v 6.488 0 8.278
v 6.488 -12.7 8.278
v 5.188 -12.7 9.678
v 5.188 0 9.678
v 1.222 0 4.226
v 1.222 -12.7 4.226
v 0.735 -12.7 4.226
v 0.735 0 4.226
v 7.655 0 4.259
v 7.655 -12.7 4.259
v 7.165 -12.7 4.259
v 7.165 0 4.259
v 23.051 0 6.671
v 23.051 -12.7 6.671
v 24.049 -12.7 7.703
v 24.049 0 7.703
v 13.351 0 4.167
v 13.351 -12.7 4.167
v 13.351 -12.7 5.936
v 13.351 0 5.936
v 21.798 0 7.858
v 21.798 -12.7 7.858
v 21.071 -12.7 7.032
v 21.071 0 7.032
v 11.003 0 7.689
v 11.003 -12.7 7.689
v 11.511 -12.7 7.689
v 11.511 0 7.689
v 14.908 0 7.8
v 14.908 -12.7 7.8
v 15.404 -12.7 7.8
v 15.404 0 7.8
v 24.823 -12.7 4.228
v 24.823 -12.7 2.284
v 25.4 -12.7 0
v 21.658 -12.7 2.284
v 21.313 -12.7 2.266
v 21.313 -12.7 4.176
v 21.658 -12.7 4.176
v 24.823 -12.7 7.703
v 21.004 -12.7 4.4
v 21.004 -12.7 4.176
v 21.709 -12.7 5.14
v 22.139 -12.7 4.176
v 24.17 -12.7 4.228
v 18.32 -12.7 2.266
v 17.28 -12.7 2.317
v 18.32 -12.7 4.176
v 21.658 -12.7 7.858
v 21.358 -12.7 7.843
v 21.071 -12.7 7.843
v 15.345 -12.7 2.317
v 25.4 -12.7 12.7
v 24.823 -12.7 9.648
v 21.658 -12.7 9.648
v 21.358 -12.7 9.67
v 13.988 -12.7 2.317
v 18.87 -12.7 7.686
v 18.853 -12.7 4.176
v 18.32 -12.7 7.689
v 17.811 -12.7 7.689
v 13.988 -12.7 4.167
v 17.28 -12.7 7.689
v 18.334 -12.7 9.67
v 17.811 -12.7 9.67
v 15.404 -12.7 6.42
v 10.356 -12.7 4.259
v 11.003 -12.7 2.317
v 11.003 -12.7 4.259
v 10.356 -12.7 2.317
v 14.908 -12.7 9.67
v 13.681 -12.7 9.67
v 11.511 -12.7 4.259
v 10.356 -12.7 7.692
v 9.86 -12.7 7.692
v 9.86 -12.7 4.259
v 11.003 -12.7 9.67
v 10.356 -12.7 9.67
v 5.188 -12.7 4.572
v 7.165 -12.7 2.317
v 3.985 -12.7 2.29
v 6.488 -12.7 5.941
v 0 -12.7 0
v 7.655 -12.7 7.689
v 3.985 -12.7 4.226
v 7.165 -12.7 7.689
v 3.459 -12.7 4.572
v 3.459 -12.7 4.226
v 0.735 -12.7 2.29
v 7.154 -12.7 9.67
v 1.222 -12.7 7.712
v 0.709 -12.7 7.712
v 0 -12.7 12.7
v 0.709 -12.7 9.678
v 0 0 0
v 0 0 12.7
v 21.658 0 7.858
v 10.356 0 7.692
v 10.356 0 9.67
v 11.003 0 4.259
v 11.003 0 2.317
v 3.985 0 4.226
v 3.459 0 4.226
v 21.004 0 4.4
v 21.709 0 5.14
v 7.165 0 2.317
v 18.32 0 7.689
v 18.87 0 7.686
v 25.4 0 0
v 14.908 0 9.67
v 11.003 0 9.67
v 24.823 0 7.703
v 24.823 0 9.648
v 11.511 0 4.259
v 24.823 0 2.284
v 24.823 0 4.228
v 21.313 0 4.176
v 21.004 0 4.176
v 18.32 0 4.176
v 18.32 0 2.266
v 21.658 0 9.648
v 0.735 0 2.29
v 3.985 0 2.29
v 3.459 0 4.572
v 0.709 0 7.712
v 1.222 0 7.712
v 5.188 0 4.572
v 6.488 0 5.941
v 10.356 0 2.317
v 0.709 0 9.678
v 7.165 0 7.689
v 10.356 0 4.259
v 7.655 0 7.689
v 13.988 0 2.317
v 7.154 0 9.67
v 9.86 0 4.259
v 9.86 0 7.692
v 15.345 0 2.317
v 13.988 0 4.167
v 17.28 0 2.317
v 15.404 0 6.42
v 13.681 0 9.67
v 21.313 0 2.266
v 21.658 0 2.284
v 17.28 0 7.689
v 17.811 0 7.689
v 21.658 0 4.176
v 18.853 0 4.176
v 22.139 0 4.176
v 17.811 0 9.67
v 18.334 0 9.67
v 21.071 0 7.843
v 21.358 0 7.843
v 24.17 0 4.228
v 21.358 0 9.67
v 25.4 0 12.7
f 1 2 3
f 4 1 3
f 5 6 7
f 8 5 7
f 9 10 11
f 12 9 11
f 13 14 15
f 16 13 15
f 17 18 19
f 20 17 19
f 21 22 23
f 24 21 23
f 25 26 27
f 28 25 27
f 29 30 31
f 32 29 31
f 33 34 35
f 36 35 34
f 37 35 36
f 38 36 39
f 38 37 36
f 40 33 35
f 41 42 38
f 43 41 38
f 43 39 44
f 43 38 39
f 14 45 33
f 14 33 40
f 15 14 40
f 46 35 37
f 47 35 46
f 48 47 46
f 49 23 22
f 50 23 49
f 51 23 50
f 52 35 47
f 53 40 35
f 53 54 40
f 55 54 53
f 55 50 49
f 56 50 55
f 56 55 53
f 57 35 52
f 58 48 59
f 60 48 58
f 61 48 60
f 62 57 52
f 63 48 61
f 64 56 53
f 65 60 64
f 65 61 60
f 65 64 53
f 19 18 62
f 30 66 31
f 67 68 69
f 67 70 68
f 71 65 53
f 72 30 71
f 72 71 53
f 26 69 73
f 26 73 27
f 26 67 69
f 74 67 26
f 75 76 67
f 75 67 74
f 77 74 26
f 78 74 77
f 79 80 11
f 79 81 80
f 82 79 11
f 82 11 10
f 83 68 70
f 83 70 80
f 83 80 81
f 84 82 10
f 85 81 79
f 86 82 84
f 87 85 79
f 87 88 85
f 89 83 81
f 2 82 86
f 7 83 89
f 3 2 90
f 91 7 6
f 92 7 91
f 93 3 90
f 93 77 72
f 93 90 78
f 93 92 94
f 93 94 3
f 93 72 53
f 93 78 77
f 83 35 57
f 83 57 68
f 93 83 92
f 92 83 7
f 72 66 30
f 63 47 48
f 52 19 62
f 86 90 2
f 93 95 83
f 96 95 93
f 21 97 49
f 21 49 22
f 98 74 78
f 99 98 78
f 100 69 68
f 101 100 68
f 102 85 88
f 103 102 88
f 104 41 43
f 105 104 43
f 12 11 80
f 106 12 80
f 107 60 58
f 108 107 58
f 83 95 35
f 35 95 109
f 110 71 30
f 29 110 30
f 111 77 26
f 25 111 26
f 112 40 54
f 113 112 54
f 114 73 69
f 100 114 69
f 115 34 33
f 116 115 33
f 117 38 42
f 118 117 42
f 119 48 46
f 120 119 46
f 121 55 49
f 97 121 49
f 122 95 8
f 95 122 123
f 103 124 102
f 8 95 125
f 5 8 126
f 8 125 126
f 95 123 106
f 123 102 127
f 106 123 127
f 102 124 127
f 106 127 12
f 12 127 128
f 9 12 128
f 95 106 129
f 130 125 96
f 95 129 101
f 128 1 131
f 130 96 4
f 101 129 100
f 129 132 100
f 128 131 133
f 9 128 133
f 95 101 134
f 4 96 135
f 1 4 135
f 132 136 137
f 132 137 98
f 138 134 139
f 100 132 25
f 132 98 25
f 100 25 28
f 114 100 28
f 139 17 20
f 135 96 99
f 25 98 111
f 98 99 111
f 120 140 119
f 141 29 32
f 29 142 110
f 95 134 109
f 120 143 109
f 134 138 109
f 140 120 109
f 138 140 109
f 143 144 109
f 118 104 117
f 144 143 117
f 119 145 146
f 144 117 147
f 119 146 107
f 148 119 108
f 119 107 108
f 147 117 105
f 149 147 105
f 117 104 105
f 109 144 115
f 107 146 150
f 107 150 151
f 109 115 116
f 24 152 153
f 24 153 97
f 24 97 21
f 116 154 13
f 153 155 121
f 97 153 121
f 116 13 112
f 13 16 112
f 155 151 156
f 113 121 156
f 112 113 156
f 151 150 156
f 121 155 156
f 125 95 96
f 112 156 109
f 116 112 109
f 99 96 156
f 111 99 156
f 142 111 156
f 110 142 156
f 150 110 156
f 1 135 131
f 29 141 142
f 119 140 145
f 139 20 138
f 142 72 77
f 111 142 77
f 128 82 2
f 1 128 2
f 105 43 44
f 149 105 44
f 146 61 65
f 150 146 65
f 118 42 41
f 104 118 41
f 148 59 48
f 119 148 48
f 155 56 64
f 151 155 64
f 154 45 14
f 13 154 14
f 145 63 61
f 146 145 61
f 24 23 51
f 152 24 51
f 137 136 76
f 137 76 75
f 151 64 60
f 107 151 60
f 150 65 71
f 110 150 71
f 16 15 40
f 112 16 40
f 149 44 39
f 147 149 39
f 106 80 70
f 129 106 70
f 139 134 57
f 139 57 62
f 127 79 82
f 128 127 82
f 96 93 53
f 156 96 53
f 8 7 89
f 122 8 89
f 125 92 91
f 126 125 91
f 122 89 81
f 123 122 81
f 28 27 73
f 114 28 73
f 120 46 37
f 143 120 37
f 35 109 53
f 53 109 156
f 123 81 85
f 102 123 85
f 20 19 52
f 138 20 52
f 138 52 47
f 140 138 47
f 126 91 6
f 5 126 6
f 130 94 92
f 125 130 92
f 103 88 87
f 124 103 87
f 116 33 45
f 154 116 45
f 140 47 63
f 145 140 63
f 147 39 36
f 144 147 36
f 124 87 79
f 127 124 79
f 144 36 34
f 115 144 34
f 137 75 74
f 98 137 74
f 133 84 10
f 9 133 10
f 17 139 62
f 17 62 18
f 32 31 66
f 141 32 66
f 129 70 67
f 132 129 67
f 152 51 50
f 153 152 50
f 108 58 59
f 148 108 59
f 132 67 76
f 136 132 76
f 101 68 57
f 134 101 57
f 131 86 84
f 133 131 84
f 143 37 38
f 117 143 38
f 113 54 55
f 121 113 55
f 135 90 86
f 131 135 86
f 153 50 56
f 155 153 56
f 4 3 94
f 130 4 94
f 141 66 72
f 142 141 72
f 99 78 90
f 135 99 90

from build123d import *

# Parameters (mm, degrees)
F0_W     = 25.4
F0_H     = 25.4
F1_DEPTH = 25.4
F3_DEPTH = 25.4
F4_W     = 25.4
F4_H     = 12.7
F5_DEPTH = 25.4
F6_W     = 12.7
F6_H     = 12.7
F7_DEPTH = 25.4


with BuildPart() as f1:
    # F0 (on Front) → F1 (new body)
    with BuildSketch(Plane.XZ):
        with Locations((12.7, 12.7)):
            Rectangle(F0_W, F0_H)
    extrude(amount=F1_DEPTH)

    # F2 (on face) → F3 (cut)
    with BuildSketch(Plane.XZ.offset(25.4)):
        Polygon((5.187699, 9.677647), (0.70863, 9.677647), (0.70863, 7.712204), (1.221623, 7.712204), (1.221623, 4.225912), (0.734957, 4.225912), (0.734957, 2.289937), (3.984629, 2.289937), (3.984629, 4.225912), (3.45915, 4.225912), (3.45915, 4.571622), (5.187699, 4.571622), (6.487568, 5.940633), (6.487568, 8.277631), align=None)
        Polygon((1.373146, 8.298191), (1.373146, 9.056263), (4.895022, 9.024677), (5.842611, 8.09288), (5.842611, 6.181907), (4.942401, 5.234317), (2.826117, 5.234317), (2.826117, 3.623415), (3.284119, 3.623415), (3.284119, 2.928515), (1.373146, 2.928515), (1.373146, 3.623415), (1.89432, 3.623415), (1.89432, 8.298191), align=None, mode=Mode.SUBTRACT)
        Polygon((10.355519, 9.670121), (7.154135, 9.670121), (7.164647, 7.688757), (7.654916, 7.688757), (7.654916, 4.259461), (7.164647, 4.259461), (7.164647, 2.317117), (10.355519, 2.317117), (10.355519, 4.259461), (9.8595, 4.259461), (9.8595, 7.691912), (10.355519, 7.691912), align=None)
        Polygon((7.806116, 8.34365), (7.802438, 9.036948), (9.705184, 9.037424), (9.708923, 8.332776), (9.163893, 8.329884), (9.18893, 3.610964), (9.708865, 3.624296), (9.722495, 2.901242), (7.792784, 2.891004), (7.788839, 3.634657), (8.348879, 3.637628), (8.348879, 8.34653), align=None, mode=Mode.SUBTRACT)
        Polygon((13.681499, 9.670121), (11.003493, 9.670121), (11.003493, 7.688757), (11.510781, 7.688757), (11.510781, 4.259461), (11.003493, 4.259461), (11.003493, 2.317117), (13.988231, 2.317117), (13.988231, 4.166804), (13.351173, 4.166804), (13.351173, 5.936412), (15.344931, 2.317117), (17.279701, 2.317117), (17.279701, 7.688757), (17.810585, 7.688757), (17.810585, 9.670121), (14.908427, 9.670121), (14.908427, 7.800398), (15.403918, 7.800398), (15.403918, 6.420104), align=None)
        Polygon((11.66257, 8.332776), (11.658834, 9.036948), (13.255958, 9.006472), (15.985473, 4.235322), (15.985473, 8.338282), (15.528347, 8.332776), (15.520232, 9.006472), (17.214789, 9.026884), (17.218454, 8.336145), (16.583439, 8.332776), (16.611911, 2.966279), (15.742617, 2.961667), (12.90889, 8.117346), (12.932612, 3.646248), (13.373935, 3.648589), (13.377531, 2.970786), (11.682376, 2.961792), (11.679067, 3.58549), (12.16921, 3.588091), (12.144037, 8.332776), align=None, mode=Mode.SUBTRACT)
        Polygon((21.357853, 9.670121), (18.333804, 9.670121), (18.319575, 7.688901), (18.870167, 7.686202), (18.852962, 4.176179), (18.319575, 4.176179), (18.319575, 2.266313), (21.31342, 2.266313), (21.31342, 4.176179), (21.00371, 4.176179), (21.00371, 4.399857), (21.709157, 5.139715), (22.139307, 4.176179), (21.65754, 4.176179), (21.65754, 2.283519), (24.823442, 2.283519), (24.823442, 4.227797), (24.169615, 4.227797), (23.051225, 6.671048), (24.049172, 7.703408), (24.823442, 7.703408), (24.823442, 9.647685), (21.65754, 9.647685), (21.65754, 7.858261), (21.798439, 7.858261), (21.070654, 7.032285), (21.070654, 7.843203), (21.357853, 7.843203), align=None)
        Polygon((19.004352, 8.332776), (19.000616, 9.036948), (20.667763, 9.036053), (20.667763, 8.306677), (20.414714, 8.306677), (20.414714, 5.552904), (22.945207, 8.336446), (22.349797, 8.336446), (22.349797, 9.036053), (24.180682, 9.036053), (24.180682, 8.312229), (23.73184, 8.312229), (22.349797, 6.743724), (23.704356, 3.588185), (24.180682, 3.588185), (24.180682, 2.962871), (22.349797, 2.962871), (22.349797, 3.588185), (22.945207, 3.588185), (21.754388, 6.207855), (20.414714, 4.644904), (20.414714, 3.588185), (20.679095, 3.588185), (20.682522, 2.942261), (19.004326, 2.933357), (19.000867, 3.585446), (19.517002, 3.588185), (19.491829, 8.332776), align=None, mode=Mode.SUBTRACT)
        Polygon((4.895022, 9.024677), (1.373146, 9.056263), (1.373146, 8.298191), (1.89432, 8.298191), (1.89432, 3.623415), (1.373146, 3.623415), (1.373146, 2.928515), (3.284119, 2.928515), (3.284119, 3.623415), (2.826117, 3.623415), (2.826117, 5.234317), (4.942401, 5.234317), (5.842611, 6.181907), (5.842611, 8.09288), align=None)
        Polygon((9.705184, 9.037424), (7.802438, 9.036948), (7.806116, 8.34365), (8.348879, 8.34653), (8.348879, 3.637628), (7.788839, 3.634657), (7.792784, 2.891004), (9.722495, 2.901242), (9.708865, 3.624296), (9.18893, 3.610964), (9.163893, 8.329884), (9.708923, 8.332776), align=None)
        Polygon((13.255958, 9.006472), (11.658834, 9.036948), (11.66257, 8.332776), (12.144037, 8.332776), (12.16921, 3.588091), (11.679067, 3.58549), (11.682376, 2.961792), (13.377531, 2.970786), (13.373935, 3.648589), (12.932612, 3.646248), (12.90889, 8.117346), (15.742617, 2.961667), (16.611911, 2.966279), (16.583439, 8.332776), (17.218454, 8.336145), (17.214789, 9.026884), (15.520232, 9.006472), (15.528347, 8.332776), (15.985473, 8.338282), (15.985473, 4.235322), align=None)
        Polygon((20.667763, 9.036053), (19.000616, 9.036948), (19.004352, 8.332776), (19.491829, 8.332776), (19.517002, 3.588185), (19.000867, 3.585446), (19.004326, 2.933357), (20.682522, 2.942261), (20.679095, 3.588185), (20.414714, 3.588185), (20.414714, 4.644904), (21.754388, 6.207855), (22.945207, 3.588185), (22.349797, 3.588185), (22.349797, 2.962871), (24.180682, 2.962871), (24.180682, 3.588185), (23.704356, 3.588185), (22.349797, 6.743724), (23.73184, 8.312229), (24.180682, 8.312229), (24.180682, 9.036053), (22.349797, 9.036053), (22.349797, 8.336446), (22.945207, 8.336446), (20.414714, 5.552904), (20.414714, 8.306677), (20.667763, 8.306677), align=None)
    extrude(amount=-F3_DEPTH, mode=Mode.SUBTRACT)

    # F4 (on face) → F5 (cut)
    with BuildSketch(Plane.XZ.offset(25.4)):
        with Locations((12.7, 19.05)):
            Rectangle(F4_W, F4_H)
    extrude(amount=-F5_DEPTH, mode=Mode.SUBTRACT)

    # F6 (on face) → F7 (cut)
    with BuildSketch(Plane(origin=(0, 0, 0), x_dir=(0, -1, 0), z_dir=(-1, 0, 0))):
        with Locations((19.05, 6.35)):
            Rectangle(F6_W, F6_H)
    extrude(amount=-F7_DEPTH, mode=Mode.SUBTRACT)


solid = f1.part
